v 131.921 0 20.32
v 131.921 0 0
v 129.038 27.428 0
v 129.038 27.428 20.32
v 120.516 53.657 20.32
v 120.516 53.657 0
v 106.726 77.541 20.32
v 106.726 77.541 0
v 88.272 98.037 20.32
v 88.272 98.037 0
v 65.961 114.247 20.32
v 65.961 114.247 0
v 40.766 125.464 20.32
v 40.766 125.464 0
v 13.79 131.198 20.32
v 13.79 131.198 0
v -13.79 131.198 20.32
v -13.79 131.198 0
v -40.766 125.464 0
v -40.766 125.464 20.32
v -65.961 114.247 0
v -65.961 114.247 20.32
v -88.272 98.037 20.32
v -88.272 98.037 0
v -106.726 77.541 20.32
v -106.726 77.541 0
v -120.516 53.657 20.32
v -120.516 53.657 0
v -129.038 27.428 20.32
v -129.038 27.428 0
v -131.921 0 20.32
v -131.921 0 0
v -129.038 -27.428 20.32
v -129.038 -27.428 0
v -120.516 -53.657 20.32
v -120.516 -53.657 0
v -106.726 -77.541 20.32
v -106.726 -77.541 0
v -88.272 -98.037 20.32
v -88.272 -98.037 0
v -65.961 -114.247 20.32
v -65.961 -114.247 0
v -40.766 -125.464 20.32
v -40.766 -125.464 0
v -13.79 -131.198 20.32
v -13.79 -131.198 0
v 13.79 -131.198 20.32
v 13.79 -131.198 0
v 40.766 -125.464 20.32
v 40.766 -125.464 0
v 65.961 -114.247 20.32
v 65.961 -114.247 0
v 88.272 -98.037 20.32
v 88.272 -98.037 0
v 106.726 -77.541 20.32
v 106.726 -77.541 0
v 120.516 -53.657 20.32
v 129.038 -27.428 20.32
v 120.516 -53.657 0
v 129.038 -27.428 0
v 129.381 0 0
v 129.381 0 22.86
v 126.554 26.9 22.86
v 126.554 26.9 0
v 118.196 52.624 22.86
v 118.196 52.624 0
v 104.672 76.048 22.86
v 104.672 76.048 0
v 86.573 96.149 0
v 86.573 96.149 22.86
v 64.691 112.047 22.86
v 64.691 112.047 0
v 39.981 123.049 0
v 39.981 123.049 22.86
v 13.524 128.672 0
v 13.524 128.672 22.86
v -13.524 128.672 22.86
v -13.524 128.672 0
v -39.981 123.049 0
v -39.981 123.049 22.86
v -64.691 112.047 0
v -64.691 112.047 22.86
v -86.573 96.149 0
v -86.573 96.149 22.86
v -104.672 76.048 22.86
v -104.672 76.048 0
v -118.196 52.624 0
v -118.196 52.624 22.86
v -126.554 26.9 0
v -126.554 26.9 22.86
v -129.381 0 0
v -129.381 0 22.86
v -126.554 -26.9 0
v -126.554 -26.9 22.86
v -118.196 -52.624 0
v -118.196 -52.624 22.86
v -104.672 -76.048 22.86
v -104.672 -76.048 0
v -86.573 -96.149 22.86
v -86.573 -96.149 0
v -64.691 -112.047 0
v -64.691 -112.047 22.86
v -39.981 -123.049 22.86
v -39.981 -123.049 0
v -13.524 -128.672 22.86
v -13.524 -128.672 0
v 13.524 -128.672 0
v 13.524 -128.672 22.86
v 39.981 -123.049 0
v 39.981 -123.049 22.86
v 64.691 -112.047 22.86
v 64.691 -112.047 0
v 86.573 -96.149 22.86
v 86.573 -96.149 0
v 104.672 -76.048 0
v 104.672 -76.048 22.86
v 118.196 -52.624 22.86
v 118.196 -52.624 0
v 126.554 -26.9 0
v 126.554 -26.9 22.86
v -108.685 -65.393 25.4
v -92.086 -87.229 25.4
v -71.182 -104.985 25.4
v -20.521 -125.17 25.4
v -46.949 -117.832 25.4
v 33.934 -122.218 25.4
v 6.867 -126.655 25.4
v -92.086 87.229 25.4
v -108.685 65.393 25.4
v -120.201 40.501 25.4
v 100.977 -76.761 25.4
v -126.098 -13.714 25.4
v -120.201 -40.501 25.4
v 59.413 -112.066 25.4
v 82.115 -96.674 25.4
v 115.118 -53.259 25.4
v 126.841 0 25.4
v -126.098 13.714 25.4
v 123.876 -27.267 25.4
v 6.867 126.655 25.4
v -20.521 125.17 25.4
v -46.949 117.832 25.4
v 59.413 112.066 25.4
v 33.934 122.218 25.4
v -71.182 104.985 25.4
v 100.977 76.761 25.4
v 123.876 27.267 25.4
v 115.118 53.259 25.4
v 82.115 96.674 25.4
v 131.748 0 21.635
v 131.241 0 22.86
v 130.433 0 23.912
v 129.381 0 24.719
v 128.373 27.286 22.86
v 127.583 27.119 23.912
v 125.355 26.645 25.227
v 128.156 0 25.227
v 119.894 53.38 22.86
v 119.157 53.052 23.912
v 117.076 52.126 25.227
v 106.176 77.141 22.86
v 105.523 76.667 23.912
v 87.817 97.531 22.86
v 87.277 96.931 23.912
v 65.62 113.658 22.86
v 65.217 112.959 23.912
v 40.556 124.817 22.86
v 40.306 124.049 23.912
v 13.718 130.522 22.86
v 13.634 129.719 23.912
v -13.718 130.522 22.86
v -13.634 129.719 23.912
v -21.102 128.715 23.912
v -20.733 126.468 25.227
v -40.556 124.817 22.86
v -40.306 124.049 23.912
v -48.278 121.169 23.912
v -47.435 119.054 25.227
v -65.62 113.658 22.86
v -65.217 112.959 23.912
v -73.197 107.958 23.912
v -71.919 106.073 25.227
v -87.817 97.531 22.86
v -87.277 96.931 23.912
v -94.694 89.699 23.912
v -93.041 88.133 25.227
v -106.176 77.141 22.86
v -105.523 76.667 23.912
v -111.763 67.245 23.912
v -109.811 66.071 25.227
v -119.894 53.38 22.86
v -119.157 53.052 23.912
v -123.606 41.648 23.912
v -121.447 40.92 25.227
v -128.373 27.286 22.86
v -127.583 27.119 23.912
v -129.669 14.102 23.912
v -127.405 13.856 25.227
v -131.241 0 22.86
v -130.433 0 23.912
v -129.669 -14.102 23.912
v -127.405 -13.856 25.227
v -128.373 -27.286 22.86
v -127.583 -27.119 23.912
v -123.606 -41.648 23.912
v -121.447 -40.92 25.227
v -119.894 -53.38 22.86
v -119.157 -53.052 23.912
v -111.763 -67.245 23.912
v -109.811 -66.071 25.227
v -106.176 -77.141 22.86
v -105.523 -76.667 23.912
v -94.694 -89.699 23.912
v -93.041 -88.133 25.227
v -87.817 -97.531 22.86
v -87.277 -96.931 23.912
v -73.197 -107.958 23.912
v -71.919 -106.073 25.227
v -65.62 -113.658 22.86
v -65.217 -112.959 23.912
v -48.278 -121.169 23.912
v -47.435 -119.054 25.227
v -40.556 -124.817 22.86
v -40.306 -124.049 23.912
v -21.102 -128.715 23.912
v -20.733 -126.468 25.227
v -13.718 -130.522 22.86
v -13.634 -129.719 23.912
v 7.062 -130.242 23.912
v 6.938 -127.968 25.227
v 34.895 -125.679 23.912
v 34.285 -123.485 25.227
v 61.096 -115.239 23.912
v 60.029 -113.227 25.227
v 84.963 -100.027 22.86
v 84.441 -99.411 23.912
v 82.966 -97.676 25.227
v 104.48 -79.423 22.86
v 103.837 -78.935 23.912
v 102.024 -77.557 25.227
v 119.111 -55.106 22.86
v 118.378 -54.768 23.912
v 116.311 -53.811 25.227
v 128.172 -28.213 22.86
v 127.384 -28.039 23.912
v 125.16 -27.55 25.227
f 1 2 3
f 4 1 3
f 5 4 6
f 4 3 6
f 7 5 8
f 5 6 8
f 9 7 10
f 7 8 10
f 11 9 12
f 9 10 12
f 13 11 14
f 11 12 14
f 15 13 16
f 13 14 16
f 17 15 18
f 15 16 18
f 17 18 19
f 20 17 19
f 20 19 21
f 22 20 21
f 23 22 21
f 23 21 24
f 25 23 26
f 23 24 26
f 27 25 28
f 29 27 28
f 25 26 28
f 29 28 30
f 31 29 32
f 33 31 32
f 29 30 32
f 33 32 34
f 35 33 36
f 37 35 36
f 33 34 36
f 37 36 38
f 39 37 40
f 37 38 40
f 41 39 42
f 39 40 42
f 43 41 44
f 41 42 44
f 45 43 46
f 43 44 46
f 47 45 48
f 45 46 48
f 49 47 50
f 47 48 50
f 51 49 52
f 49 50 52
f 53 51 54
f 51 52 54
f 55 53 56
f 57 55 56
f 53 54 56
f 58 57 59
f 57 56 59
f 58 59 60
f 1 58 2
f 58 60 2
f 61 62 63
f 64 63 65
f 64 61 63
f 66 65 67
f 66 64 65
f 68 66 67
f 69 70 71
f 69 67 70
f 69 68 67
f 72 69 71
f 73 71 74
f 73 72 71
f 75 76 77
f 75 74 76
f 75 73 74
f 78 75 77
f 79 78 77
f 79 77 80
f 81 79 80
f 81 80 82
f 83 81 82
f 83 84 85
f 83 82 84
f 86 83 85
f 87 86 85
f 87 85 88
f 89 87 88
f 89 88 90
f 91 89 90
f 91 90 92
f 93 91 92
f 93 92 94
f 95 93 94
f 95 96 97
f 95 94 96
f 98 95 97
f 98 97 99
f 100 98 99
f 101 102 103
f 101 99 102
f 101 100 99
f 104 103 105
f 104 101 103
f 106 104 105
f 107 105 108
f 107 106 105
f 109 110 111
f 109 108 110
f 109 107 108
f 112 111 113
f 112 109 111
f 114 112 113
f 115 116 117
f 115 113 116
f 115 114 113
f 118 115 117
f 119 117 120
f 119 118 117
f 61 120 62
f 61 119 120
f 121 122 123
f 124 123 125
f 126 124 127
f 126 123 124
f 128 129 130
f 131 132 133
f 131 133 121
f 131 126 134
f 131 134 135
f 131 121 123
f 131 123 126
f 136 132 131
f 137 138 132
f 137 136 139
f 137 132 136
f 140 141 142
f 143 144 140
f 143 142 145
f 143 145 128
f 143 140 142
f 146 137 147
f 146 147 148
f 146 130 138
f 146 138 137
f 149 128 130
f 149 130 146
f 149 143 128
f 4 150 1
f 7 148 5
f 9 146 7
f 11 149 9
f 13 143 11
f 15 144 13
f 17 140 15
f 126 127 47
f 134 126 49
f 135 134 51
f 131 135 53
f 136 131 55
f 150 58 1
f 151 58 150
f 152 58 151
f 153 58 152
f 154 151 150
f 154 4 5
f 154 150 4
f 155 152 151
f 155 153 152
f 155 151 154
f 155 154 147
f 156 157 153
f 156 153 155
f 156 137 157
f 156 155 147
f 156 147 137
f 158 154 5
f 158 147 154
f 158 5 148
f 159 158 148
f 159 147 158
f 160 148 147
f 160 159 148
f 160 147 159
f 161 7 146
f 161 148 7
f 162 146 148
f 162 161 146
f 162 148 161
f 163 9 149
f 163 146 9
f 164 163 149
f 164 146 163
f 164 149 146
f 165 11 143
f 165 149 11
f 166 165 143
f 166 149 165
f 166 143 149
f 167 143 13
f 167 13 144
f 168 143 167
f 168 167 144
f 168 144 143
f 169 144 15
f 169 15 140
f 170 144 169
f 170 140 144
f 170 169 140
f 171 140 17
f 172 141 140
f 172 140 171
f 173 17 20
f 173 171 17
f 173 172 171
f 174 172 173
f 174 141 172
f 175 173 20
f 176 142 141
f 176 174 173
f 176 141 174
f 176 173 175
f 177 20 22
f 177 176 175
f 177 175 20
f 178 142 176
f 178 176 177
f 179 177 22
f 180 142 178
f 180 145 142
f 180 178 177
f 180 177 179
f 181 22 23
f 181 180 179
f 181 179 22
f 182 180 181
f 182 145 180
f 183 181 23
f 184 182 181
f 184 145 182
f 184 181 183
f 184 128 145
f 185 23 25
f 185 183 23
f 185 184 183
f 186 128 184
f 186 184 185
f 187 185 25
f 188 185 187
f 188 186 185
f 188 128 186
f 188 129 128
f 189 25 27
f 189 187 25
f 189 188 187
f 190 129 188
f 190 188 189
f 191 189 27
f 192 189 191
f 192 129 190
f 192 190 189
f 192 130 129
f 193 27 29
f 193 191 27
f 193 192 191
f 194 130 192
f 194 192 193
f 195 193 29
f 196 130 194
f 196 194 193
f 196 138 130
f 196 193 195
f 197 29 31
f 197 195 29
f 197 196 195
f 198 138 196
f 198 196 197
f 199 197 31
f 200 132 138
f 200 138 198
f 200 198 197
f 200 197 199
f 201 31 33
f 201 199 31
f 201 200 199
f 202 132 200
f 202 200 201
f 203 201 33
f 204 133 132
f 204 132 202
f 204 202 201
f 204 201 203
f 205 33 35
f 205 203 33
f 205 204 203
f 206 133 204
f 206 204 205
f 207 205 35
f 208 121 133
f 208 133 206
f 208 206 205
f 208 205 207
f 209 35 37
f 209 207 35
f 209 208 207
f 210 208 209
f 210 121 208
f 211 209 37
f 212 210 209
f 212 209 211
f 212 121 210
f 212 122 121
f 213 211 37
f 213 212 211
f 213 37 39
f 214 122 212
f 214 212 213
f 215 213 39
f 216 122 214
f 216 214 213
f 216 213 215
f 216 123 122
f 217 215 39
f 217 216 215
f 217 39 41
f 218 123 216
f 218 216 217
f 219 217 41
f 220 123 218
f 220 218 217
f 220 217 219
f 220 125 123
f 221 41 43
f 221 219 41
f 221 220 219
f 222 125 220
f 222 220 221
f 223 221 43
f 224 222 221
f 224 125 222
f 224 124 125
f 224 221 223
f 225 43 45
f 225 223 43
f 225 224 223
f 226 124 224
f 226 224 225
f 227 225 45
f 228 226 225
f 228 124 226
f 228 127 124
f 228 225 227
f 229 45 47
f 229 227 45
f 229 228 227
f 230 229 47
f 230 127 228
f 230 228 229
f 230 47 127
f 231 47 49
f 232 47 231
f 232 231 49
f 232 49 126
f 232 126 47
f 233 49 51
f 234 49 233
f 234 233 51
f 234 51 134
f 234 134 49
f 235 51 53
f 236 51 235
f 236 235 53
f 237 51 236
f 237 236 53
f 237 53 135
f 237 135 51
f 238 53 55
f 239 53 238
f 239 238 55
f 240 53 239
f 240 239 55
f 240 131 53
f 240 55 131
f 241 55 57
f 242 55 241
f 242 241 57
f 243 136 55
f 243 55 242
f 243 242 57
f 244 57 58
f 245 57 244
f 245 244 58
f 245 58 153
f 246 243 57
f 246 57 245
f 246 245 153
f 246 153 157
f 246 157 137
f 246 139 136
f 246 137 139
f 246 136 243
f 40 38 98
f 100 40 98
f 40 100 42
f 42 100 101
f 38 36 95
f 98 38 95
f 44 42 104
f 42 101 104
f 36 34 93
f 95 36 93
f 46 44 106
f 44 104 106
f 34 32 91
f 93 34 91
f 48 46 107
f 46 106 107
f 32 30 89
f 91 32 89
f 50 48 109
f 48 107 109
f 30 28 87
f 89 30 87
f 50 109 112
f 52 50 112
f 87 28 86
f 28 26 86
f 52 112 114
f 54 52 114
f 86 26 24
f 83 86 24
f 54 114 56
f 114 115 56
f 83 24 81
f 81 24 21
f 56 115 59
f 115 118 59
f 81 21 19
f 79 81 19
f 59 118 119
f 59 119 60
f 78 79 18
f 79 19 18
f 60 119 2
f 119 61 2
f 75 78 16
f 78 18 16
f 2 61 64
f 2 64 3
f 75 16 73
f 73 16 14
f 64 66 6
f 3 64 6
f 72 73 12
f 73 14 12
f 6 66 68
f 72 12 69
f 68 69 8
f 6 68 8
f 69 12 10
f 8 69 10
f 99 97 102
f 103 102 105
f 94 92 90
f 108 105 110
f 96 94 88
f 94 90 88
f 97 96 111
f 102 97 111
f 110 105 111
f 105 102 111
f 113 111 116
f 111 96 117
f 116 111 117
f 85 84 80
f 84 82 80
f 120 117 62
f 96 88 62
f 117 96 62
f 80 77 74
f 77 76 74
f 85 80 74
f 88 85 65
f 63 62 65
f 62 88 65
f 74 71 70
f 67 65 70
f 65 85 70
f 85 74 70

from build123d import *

# Parameters (mm, degrees)
F0_R     = 131.921172
F1_DEPTH = 25.4
F2_T     = -2.54
F3_R     = 5.08


with BuildPart() as f1:
    # F0 (on Top) → F1 (new body)
    with BuildSketch(Plane.XY):
        Circle(F0_R)
    extrude(amount=F1_DEPTH)

    # F2
    f2_openings = [f1.faces().sort_by_distance(p)[0] for p in [
        (0, 0, 0),
    ]]
    offset(amount=F2_T, openings=f2_openings)

    # F3
    f3_edges = [f1.edges().sort_by_distance(p)[0] for p in [
        (-131.921172, 0, 25.4),
    ]]
    fillet(f3_edges, radius=F3_R)


solid = f1.part
